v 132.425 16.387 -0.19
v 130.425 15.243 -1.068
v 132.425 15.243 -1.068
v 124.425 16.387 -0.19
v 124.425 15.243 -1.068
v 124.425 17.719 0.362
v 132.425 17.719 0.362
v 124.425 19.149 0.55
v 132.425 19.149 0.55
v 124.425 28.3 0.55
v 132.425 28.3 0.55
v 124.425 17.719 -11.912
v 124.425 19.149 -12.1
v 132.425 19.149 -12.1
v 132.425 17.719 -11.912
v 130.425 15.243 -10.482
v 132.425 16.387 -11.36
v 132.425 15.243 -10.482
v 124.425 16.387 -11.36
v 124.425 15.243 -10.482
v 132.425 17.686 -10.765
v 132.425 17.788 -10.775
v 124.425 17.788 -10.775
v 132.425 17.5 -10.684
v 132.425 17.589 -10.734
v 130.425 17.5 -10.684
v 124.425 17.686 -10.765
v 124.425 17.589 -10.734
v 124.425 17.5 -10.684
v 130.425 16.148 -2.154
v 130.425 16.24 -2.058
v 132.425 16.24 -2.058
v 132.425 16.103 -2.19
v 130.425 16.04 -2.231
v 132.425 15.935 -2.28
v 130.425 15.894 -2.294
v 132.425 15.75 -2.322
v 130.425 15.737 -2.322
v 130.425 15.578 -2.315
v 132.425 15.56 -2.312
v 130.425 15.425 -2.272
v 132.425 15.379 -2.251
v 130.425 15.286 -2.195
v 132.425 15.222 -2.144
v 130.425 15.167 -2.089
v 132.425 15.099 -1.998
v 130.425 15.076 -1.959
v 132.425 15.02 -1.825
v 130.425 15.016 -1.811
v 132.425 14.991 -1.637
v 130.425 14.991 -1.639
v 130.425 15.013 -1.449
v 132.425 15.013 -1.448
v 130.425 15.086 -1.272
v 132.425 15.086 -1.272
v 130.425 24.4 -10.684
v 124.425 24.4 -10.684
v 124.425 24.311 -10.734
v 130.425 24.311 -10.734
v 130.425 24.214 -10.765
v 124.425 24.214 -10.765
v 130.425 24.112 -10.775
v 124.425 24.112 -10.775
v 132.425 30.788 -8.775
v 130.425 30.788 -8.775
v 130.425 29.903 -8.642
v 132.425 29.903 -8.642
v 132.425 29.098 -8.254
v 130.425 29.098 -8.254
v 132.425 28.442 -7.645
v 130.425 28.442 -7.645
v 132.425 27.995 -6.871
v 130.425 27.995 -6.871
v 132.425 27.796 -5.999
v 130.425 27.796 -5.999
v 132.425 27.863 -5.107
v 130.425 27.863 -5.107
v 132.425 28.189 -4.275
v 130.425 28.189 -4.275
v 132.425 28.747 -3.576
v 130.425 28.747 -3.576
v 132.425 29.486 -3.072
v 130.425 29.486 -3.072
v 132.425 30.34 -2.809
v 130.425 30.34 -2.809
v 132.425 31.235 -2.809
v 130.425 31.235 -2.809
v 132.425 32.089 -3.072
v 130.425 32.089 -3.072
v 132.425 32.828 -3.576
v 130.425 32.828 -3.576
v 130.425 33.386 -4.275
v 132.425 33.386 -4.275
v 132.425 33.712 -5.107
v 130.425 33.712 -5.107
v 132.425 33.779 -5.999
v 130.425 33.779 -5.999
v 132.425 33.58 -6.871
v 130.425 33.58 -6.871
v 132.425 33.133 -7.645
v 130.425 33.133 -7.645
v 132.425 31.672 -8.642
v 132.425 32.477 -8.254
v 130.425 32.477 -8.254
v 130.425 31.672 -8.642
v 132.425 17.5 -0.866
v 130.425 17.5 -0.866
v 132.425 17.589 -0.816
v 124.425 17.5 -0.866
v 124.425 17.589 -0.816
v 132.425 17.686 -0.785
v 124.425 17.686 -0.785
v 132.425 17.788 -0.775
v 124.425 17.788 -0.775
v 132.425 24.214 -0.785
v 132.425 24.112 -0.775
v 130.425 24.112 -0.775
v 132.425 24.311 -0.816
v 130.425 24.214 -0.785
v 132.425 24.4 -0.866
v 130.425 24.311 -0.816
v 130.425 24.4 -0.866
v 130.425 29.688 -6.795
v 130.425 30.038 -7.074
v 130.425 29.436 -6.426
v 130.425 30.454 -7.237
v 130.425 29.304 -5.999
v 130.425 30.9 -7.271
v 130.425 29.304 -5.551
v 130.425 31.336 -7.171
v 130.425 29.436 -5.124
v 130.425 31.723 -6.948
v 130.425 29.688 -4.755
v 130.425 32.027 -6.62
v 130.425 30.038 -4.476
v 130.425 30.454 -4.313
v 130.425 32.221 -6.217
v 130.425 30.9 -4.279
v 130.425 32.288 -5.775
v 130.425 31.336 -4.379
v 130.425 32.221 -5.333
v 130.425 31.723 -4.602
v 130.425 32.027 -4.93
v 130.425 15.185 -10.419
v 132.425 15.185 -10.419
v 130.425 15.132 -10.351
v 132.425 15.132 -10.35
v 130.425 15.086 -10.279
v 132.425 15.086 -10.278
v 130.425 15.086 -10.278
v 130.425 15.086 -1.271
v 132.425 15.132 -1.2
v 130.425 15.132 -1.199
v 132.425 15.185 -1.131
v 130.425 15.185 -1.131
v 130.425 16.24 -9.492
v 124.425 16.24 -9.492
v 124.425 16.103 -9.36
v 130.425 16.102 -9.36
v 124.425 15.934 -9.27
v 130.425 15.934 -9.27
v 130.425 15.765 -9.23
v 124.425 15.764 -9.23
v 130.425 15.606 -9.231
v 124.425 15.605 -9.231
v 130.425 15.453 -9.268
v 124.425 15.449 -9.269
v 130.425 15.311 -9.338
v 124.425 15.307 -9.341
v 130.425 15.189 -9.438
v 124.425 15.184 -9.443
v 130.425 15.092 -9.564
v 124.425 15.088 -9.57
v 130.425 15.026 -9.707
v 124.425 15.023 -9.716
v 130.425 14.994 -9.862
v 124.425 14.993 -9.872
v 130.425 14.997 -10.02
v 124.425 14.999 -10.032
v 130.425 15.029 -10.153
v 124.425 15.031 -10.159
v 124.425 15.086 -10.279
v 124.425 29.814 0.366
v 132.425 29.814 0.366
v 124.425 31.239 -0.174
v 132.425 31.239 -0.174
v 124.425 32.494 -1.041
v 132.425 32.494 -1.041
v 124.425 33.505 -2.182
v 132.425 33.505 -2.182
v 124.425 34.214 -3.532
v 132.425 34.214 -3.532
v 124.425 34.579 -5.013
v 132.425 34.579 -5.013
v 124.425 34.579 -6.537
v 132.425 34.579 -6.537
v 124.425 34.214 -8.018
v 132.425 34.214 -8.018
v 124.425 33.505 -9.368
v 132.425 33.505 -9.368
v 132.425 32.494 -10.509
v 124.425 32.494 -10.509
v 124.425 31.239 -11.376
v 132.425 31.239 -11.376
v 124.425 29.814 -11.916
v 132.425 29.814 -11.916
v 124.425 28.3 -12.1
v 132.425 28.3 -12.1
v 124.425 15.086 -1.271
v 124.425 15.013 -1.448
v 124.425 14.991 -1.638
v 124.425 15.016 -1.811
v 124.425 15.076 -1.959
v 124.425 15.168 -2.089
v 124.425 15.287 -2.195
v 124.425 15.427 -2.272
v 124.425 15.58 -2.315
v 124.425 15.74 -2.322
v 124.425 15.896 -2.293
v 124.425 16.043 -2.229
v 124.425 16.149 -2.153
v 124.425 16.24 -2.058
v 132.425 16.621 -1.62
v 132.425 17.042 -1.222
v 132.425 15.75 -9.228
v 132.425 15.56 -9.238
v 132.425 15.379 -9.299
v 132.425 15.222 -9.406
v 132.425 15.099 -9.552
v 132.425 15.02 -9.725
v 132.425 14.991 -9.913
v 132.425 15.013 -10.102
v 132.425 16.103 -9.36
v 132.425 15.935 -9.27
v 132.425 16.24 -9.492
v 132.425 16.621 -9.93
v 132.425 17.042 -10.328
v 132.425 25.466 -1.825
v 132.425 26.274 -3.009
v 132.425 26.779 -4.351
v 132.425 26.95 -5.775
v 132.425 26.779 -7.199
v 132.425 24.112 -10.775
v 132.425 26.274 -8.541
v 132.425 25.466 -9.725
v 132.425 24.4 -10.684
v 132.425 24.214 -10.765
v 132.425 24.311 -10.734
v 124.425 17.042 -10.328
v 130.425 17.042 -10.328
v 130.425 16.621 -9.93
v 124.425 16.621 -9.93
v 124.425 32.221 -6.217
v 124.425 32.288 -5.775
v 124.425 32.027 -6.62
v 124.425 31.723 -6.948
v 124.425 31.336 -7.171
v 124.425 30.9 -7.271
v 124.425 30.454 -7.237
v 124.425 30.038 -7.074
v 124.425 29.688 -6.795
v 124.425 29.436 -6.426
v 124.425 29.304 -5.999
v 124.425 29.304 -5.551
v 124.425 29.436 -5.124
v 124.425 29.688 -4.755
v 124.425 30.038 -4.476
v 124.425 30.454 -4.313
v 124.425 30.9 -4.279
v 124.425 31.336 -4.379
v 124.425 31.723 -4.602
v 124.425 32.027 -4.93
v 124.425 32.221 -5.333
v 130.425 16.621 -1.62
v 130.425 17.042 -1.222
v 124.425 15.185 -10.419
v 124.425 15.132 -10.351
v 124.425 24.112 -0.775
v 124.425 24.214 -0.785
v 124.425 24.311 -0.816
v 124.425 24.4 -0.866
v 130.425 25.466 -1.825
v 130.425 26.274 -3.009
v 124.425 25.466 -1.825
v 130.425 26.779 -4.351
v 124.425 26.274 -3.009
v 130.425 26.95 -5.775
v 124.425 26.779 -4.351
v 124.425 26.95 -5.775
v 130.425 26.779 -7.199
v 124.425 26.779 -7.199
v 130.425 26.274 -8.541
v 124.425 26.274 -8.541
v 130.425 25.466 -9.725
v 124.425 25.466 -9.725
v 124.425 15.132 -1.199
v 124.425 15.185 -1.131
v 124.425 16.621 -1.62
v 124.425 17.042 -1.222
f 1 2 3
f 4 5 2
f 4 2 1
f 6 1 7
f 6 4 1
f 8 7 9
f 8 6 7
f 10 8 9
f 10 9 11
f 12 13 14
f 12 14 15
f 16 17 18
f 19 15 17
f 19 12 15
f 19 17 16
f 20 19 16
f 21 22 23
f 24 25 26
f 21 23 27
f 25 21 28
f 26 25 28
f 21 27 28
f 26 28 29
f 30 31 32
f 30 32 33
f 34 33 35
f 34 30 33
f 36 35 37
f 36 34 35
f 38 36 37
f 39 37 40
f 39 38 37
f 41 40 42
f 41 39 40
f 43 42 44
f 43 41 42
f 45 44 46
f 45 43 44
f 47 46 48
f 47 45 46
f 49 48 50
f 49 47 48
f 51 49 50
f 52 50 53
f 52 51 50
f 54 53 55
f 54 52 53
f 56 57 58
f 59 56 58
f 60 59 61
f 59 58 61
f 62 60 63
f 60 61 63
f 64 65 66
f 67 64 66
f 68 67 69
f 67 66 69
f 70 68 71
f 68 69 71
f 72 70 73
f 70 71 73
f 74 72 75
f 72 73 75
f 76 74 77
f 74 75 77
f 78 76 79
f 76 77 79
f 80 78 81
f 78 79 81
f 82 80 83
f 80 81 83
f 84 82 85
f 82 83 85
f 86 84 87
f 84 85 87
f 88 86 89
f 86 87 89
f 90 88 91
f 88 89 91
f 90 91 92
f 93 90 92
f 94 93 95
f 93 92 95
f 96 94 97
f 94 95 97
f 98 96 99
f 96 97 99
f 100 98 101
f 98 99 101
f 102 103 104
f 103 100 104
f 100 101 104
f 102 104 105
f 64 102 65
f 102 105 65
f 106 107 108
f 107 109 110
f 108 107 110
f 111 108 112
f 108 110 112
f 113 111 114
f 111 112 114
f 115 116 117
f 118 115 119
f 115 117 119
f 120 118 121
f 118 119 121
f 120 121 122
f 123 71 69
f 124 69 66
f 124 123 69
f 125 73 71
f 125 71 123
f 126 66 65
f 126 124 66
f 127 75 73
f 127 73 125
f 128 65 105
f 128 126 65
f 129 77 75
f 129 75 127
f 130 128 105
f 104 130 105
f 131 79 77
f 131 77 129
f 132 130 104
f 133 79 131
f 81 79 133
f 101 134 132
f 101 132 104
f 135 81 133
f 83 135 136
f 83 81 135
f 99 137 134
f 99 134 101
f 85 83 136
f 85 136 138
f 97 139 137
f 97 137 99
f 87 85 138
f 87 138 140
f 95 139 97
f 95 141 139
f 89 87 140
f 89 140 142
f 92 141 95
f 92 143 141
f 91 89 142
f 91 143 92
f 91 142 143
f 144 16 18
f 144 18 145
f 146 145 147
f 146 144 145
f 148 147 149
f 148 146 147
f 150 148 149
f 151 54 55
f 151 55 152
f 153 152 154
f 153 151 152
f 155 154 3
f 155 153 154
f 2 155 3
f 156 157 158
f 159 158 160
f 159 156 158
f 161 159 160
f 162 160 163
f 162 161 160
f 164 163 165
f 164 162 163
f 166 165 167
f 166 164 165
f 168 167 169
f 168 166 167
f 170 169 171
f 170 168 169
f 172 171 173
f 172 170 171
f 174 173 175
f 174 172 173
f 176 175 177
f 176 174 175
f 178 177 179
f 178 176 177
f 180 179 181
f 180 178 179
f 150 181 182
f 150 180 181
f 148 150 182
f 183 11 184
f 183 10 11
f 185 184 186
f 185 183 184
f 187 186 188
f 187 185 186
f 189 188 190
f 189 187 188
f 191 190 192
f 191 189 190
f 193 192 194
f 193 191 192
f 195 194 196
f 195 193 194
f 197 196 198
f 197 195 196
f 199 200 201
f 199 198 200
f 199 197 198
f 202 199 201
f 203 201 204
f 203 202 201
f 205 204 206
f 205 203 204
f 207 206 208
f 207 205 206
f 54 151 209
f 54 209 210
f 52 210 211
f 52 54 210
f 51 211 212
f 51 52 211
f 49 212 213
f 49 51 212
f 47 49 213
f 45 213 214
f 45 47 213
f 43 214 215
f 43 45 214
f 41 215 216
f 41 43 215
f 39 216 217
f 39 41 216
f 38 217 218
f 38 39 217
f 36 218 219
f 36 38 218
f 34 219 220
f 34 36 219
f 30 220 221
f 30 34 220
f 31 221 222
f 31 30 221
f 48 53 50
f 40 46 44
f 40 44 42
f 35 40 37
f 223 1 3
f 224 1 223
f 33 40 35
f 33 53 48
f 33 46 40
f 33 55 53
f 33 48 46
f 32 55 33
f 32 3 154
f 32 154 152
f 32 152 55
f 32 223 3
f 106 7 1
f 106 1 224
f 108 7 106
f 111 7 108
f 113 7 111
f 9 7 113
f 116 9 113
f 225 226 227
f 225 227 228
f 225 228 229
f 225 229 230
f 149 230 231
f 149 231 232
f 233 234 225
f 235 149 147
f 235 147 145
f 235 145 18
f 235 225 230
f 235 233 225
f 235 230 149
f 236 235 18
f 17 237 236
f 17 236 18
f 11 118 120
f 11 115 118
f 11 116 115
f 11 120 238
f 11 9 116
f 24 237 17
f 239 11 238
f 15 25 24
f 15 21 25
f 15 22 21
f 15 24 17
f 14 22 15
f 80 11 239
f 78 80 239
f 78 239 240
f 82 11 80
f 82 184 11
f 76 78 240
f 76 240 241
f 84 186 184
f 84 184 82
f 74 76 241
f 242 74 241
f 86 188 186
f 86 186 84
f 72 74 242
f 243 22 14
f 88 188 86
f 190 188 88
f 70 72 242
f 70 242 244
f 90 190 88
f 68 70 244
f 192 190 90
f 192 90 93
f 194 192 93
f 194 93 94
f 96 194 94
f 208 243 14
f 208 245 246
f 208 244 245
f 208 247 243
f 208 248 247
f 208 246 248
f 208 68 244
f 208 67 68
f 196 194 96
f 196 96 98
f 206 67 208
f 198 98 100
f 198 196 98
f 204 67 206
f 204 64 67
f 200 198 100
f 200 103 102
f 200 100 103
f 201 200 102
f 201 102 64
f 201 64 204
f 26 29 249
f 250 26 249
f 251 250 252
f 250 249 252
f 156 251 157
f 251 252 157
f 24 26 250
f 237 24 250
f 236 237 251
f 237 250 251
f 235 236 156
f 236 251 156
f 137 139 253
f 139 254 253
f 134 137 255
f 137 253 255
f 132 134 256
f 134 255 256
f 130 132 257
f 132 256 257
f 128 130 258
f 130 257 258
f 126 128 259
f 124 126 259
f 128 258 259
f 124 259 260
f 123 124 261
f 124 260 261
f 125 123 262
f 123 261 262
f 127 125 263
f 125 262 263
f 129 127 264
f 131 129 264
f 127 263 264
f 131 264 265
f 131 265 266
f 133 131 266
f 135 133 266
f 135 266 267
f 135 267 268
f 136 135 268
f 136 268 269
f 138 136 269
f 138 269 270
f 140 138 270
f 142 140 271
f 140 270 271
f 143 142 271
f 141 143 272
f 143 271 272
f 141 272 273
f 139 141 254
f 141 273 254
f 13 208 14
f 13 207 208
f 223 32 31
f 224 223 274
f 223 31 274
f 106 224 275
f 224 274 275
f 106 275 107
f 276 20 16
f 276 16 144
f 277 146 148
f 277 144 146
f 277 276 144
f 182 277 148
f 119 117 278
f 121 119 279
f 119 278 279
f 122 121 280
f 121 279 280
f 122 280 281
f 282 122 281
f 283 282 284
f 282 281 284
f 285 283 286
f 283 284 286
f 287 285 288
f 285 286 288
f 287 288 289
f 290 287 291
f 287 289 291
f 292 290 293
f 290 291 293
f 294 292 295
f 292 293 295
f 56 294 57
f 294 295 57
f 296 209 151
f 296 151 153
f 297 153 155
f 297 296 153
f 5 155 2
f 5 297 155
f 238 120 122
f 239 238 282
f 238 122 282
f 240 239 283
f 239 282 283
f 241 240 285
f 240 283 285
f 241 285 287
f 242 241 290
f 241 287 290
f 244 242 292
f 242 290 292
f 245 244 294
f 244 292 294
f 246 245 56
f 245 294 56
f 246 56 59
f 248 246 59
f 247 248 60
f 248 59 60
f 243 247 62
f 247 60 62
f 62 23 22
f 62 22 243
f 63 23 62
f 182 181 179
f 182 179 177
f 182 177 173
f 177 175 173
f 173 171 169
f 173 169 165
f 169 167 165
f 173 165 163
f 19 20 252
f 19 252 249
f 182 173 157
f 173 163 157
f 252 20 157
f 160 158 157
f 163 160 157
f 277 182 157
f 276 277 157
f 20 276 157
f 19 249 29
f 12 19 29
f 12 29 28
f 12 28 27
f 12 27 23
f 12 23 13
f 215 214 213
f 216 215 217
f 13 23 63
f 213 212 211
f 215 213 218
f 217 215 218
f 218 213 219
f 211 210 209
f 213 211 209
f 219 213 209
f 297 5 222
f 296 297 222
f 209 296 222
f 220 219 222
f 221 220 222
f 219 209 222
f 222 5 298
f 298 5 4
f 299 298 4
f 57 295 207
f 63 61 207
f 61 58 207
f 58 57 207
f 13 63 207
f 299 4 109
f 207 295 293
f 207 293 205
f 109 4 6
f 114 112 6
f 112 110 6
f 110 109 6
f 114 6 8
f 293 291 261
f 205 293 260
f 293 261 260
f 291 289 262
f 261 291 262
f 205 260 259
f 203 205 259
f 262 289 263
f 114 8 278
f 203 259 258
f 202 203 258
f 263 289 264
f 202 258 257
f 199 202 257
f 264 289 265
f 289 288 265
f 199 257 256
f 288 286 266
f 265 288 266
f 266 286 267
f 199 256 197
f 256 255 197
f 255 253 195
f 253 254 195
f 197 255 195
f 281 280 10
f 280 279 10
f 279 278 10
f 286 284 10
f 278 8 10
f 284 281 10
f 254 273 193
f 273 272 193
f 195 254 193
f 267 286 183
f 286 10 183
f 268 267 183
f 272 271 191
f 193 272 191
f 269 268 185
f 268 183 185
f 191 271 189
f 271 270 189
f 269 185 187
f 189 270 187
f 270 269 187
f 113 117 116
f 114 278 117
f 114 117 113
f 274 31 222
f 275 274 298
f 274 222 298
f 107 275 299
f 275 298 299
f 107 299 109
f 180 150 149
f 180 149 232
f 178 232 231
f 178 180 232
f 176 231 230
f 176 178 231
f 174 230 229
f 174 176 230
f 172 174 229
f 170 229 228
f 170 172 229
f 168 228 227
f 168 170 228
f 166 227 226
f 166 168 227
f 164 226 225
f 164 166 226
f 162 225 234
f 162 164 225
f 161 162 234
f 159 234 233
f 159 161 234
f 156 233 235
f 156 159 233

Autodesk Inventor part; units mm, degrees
ref_plane "YZ Plane" through (0, 0, 0) normal (1, 0, 0) x (0, 1, 0)
ref_plane "XZ Plane" through (0, 0, 0) normal (0, 1, 0) x (-1, 0, 0)
sketch "Sketch1" plane through (0, 0, 0) normal (1, 0, 0) x (0, 1, 0)
  line L0 (14.875, -0.7) -> (14.875, 0.8967) projected
  line L1 (27.025, -0.7) -> (14.875, -0.7) projected
  line L2 (27.025, -10.85) -> (27.025, -0.7) projected
  line L3 (15.75, -10.85) -> (27.025, -10.85) projected
  line L4 (34.625, -12.1) -> (15.75, -12.1) projected
  line L5 (34.625, -3.2) -> (34.625, -12.1) projected
  line L6 (15.7197, 0.55) -> (30.875, 0.55) projected
  arc A0 (17.7877, -0.775) -> (17.5002, -0.8659) centre (17.7877, -1.275) ccw projected
  arc A1 (17.5002, -0.8659) -> (17.5002, -10.6841) centre (20.95, -5.775) ccw projected
  arc A2 (17.5002, -10.6841) -> (17.7877, -10.775) centre (17.7877, -10.275) ccw projected
  line L7 (17.7877, -10.775) -> (24.1123, -10.775) projected
  arc A3 (24.1123, -10.775) -> (24.3998, -10.6841) centre (24.1123, -10.275) ccw projected
  arc A4 (24.3998, -10.6841) -> (24.3998, -0.8659) centre (20.95, -5.775) ccw projected
  arc A5 (24.3998, -0.8659) -> (24.1123, -0.775) centre (24.1123, -1.275) ccw projected
  line L8 (24.1123, -0.775) -> (17.7877, -0.775) projected
  line L9 (26.95, -5.775) -> (26.95, -9.775) projected
  arc A6 (24.3998, -10.6841) -> (26.95, -5.775) centre (20.95, -5.775) ccw projected
  arc A7 (24.1123, -10.775) -> (24.3998, -10.6841) centre (24.1123, -10.275) ccw projected
  line L10 (25.95, -10.775) -> (24.1123, -10.775) projected
  arc A8 (25.95, -10.775) -> (26.95, -9.775) centre (25.95, -9.775) ccw projected
  line L11 (24.1123, -0.775) -> (25.95, -0.775) projected
  arc A9 (24.3998, -0.8659) -> (24.1123, -0.775) centre (24.1123, -1.275) ccw projected
  arc A10 (26.95, -5.775) -> (24.3998, -0.8659) centre (20.95, -5.775) ccw projected
  line L12 (26.95, -1.775) -> (26.95, -5.775) projected
  arc A11 (26.95, -1.775) -> (25.95, -0.775) centre (25.95, -1.775) ccw projected
  line L13 (14.95, -5.775) -> (14.95, -1.775) projected
  arc A12 (17.5002, -0.8659) -> (14.95, -5.775) centre (20.95, -5.775) ccw projected
  arc A13 (17.7877, -0.775) -> (17.5002, -0.8659) centre (17.7877, -1.275) ccw projected
  line L14 (15.95, -0.775) -> (17.7877, -0.775) projected
  arc A14 (15.95, -0.775) -> (14.95, -1.775) centre (15.95, -1.775) ccw projected
  line L15 (17.7877, -10.775) -> (15.95, -10.775) projected
  arc A15 (17.5002, -10.6841) -> (17.7877, -10.775) centre (17.7877, -10.275) ccw projected
  arc A16 (14.95, -5.775) -> (17.5002, -10.6841) centre (20.95, -5.775) ccw projected
  line L16 (14.95, -9.775) -> (14.95, -5.775) projected
  arc A17 (14.95, -9.775) -> (15.95, -10.775) centre (15.95, -9.775) ccw projected
  line L17 (26.95, -10.85) -> (14.95, -10.85)
  line L18 (14.95, -10.85) -> (14.95, -12.1)
  line L19 (14.95, -12.1) -> (26.95, -12.1)
  line L20 (26.95, -12.1) -> (26.95, -10.85)
  line L21 (20.95, -5.775) -> (14.95, -5.775)
  arc A18 (15.2429, -10.4821) -> (19.1488, -12.1) centre (19.1488, -6.5762) ccw
  arc A19 (15.8269, -8.8981) -> (14.95, -9.775) centre (15.8269, -9.775) ccw
  line L22 (14.95, -9.775) -> (15.8269, -8.8981) construction
  line L23 (14.95, -9.775) -> (16.1901, -9.775) construction
  line L24 (26.95, -0.7) -> (14.95, -0.7)
  line L25 (14.95, -0.7) -> (14.95, 0.55)
  line L26 (14.95, 0.55) -> (26.95, 0.55)
  line L27 (26.95, 0.55) -> (26.95, -0.7)
  arc A20 (19.1488, 0.55) -> (15.2429, -1.0679) centre (19.1488, -4.9738) ccw
  arc A21 (14.95, -1.775) -> (15.8269, -2.6519) centre (15.8269, -1.775) ccw
  line L28 (26.95, -12.1) -> (26.95, 0.55)
  line L29 (26.95, 0.55) -> (34.625, 0.55)
  line L30 (34.625, 0.55) -> (34.625, -12.1)
  line L31 (34.625, -12.1) -> (26.95, -12.1)
  line L32 (26.95, -5.775) -> (34.625, -5.775)
  circle A22 centre (30.7875, -5.775) radius 1.5
  circle A23 centre (30.7875, -5.775) radius 3
  arc A24 (28.3, -12.1) -> (34.625, -5.775) centre (28.3, -5.775) ccw
  arc A25 (34.625, -5.775) -> (28.3, 0.55) centre (28.3, -5.775) ccw
  line L33 (15.75, -12.1) -> (15.75, -10.85) projected
  arc A26 (34.625, -3.2) -> (30.875, 0.55) centre (30.875, -3.2) ccw projected
  arc A27 (14.8505, 1.3251) -> (15.7197, 0.55) centre (15.7197, 1.425) ccw projected
  arc A28 (14.875, 0.8967) -> (14.8505, 1.3251) centre (11.125, 0.8967) ccw projected
  circle A29 centre (30.7875, -5.775) radius 1.4375 projected
  point P0 (0, 0)
  point P1 (15.8269, -8.8981)
  point P2 (19.1488, -12.1)
  point P3 (28.3, -12.1)
  point P4 (28.3, 0.55)
  point P5 (19.1488, 0.55)
  point P6 (15.2429, -1.0679)
  point P7 (15.8269, -2.6519)
  point P8 (15.75, -10.9306)
  point P9 (27.025, -5.775)
  point P10 (15.6492, -0.7)
  dimension "d0" = 1.25
  dimension "d1" = 45
  dimension "d2" = 3
  dimension "d3" = 6
ref_plane "Work Plane1" through (124.425, 27.025, -10.85) normal (1, 0, 0) x (0, 1, 0)
extrude "Extrusion1" add sketch "Sketch1" along normal blind 6 from surface at 124.425 contours A20 L6 L27 L1 | L1 L28 A11 L11 L8 L14 A14 A20 | L27 L6 A25 L32 A23 L2 L1 | L1 L2 L32 L12 L28 | A14 L14 A0 A1 A21 | L12 A4 A5 L11 A11 | L32 A23 A24 L4 L20 L3 L2 | L2 L3 L28 L9 L32 | L9 A8 L10 A3 A4 | A23 L32 A22 | L32 A22 A23 | L28 L3 L17 A18 A17 L15 L7 L10 A8 | A1 A2 L15 A17 A19 | L20 L4 A18 L33 L3 | L33 A18 L17
fillet "Fillet1" radius 0.7 2 edges at (127.425, 15.8269, -2.6519) (127.425, 15.8269, -8.8981)
sketch "Sketch2" plane through (130.425, 19.1488, -12.1) normal (1, 0, 0) x (0, 0, -1)
  arc A0 (-2.6078, -2.9087) -> (-1.8221, -4.0632) centre (-2.1741, -3.4581) ccw projected
  line L0 (0, 9.1512) -> (0, 0) projected
  line L1 (-12.65, 0) -> (-12.65, 9.1512) projected
  arc A1 (-11.0321, -3.9059) -> (-10.8279, -4.0632) centre (-10.325, -3.1988) ccw projected
  arc A2 (-11.2341, -1.6486) -> (-10.0422, -2.9087) centre (-6.325, 1.8012) ccw projected
  arc A3 (-11.325, -1.3611) -> (-11.2341, -1.6486) centre (-10.825, -1.3611) ccw projected
  arc A4 (-2.6078, -2.9087) -> (-1.4159, -1.6486) centre (-6.325, 1.8012) ccw projected
  circle A5 centre (-6.325, 11.6387) radius 1.5 projected
  circle A6 centre (-6.325, 11.6387) radius 3
  arc A7 (-1.8221, -4.0632) -> (-1.6179, -3.9059) centre (-2.325, -3.1988) ccw projected
  arc A8 (-1.6179, -3.9059) -> (0, 0) centre (-5.5238, 0) ccw projected
  arc A9 (0, 9.1512) -> (-12.65, 9.1512) centre (-6.325, 9.1512) ccw projected
  arc A10 (-12.65, 0) -> (-11.0321, -3.9059) centre (-7.1262, 0) ccw projected
  arc A11 (-10.8279, -4.0632) -> (-10.0422, -2.9087) centre (-10.4759, -3.4581) ccw projected
  line L2 (-11.325, 4.9634) -> (-11.325, -1.3611) projected
  arc A12 (-11.2341, 5.2509) -> (-11.325, 4.9634) centre (-10.825, 4.9634) ccw projected
  arc A13 (-1.4159, 5.2509) -> (-11.2341, 5.2509) centre (-6.325, 1.8012) ccw projected
  arc A14 (-1.325, 4.9634) -> (-1.4159, 5.2509) centre (-1.825, 4.9634) ccw projected
  line L3 (-1.325, -1.3611) -> (-1.325, 4.9634) projected
  arc A15 (-1.4159, -1.6486) -> (-1.325, -1.3611) centre (-1.825, -1.3611) ccw projected
  point P0 (-12.1, -19.1488)
  dimension "d7" = 6
extrude "Extrusion2" add sketch "Sketch2" along normal blind 2 contours A4 A15 L3 A14 A13 A12 L2 A3 A2 A11 A1 A10 L1 A9 L0 A8 A7 A0
properties part number "X Stage Motor Clamp V5"
